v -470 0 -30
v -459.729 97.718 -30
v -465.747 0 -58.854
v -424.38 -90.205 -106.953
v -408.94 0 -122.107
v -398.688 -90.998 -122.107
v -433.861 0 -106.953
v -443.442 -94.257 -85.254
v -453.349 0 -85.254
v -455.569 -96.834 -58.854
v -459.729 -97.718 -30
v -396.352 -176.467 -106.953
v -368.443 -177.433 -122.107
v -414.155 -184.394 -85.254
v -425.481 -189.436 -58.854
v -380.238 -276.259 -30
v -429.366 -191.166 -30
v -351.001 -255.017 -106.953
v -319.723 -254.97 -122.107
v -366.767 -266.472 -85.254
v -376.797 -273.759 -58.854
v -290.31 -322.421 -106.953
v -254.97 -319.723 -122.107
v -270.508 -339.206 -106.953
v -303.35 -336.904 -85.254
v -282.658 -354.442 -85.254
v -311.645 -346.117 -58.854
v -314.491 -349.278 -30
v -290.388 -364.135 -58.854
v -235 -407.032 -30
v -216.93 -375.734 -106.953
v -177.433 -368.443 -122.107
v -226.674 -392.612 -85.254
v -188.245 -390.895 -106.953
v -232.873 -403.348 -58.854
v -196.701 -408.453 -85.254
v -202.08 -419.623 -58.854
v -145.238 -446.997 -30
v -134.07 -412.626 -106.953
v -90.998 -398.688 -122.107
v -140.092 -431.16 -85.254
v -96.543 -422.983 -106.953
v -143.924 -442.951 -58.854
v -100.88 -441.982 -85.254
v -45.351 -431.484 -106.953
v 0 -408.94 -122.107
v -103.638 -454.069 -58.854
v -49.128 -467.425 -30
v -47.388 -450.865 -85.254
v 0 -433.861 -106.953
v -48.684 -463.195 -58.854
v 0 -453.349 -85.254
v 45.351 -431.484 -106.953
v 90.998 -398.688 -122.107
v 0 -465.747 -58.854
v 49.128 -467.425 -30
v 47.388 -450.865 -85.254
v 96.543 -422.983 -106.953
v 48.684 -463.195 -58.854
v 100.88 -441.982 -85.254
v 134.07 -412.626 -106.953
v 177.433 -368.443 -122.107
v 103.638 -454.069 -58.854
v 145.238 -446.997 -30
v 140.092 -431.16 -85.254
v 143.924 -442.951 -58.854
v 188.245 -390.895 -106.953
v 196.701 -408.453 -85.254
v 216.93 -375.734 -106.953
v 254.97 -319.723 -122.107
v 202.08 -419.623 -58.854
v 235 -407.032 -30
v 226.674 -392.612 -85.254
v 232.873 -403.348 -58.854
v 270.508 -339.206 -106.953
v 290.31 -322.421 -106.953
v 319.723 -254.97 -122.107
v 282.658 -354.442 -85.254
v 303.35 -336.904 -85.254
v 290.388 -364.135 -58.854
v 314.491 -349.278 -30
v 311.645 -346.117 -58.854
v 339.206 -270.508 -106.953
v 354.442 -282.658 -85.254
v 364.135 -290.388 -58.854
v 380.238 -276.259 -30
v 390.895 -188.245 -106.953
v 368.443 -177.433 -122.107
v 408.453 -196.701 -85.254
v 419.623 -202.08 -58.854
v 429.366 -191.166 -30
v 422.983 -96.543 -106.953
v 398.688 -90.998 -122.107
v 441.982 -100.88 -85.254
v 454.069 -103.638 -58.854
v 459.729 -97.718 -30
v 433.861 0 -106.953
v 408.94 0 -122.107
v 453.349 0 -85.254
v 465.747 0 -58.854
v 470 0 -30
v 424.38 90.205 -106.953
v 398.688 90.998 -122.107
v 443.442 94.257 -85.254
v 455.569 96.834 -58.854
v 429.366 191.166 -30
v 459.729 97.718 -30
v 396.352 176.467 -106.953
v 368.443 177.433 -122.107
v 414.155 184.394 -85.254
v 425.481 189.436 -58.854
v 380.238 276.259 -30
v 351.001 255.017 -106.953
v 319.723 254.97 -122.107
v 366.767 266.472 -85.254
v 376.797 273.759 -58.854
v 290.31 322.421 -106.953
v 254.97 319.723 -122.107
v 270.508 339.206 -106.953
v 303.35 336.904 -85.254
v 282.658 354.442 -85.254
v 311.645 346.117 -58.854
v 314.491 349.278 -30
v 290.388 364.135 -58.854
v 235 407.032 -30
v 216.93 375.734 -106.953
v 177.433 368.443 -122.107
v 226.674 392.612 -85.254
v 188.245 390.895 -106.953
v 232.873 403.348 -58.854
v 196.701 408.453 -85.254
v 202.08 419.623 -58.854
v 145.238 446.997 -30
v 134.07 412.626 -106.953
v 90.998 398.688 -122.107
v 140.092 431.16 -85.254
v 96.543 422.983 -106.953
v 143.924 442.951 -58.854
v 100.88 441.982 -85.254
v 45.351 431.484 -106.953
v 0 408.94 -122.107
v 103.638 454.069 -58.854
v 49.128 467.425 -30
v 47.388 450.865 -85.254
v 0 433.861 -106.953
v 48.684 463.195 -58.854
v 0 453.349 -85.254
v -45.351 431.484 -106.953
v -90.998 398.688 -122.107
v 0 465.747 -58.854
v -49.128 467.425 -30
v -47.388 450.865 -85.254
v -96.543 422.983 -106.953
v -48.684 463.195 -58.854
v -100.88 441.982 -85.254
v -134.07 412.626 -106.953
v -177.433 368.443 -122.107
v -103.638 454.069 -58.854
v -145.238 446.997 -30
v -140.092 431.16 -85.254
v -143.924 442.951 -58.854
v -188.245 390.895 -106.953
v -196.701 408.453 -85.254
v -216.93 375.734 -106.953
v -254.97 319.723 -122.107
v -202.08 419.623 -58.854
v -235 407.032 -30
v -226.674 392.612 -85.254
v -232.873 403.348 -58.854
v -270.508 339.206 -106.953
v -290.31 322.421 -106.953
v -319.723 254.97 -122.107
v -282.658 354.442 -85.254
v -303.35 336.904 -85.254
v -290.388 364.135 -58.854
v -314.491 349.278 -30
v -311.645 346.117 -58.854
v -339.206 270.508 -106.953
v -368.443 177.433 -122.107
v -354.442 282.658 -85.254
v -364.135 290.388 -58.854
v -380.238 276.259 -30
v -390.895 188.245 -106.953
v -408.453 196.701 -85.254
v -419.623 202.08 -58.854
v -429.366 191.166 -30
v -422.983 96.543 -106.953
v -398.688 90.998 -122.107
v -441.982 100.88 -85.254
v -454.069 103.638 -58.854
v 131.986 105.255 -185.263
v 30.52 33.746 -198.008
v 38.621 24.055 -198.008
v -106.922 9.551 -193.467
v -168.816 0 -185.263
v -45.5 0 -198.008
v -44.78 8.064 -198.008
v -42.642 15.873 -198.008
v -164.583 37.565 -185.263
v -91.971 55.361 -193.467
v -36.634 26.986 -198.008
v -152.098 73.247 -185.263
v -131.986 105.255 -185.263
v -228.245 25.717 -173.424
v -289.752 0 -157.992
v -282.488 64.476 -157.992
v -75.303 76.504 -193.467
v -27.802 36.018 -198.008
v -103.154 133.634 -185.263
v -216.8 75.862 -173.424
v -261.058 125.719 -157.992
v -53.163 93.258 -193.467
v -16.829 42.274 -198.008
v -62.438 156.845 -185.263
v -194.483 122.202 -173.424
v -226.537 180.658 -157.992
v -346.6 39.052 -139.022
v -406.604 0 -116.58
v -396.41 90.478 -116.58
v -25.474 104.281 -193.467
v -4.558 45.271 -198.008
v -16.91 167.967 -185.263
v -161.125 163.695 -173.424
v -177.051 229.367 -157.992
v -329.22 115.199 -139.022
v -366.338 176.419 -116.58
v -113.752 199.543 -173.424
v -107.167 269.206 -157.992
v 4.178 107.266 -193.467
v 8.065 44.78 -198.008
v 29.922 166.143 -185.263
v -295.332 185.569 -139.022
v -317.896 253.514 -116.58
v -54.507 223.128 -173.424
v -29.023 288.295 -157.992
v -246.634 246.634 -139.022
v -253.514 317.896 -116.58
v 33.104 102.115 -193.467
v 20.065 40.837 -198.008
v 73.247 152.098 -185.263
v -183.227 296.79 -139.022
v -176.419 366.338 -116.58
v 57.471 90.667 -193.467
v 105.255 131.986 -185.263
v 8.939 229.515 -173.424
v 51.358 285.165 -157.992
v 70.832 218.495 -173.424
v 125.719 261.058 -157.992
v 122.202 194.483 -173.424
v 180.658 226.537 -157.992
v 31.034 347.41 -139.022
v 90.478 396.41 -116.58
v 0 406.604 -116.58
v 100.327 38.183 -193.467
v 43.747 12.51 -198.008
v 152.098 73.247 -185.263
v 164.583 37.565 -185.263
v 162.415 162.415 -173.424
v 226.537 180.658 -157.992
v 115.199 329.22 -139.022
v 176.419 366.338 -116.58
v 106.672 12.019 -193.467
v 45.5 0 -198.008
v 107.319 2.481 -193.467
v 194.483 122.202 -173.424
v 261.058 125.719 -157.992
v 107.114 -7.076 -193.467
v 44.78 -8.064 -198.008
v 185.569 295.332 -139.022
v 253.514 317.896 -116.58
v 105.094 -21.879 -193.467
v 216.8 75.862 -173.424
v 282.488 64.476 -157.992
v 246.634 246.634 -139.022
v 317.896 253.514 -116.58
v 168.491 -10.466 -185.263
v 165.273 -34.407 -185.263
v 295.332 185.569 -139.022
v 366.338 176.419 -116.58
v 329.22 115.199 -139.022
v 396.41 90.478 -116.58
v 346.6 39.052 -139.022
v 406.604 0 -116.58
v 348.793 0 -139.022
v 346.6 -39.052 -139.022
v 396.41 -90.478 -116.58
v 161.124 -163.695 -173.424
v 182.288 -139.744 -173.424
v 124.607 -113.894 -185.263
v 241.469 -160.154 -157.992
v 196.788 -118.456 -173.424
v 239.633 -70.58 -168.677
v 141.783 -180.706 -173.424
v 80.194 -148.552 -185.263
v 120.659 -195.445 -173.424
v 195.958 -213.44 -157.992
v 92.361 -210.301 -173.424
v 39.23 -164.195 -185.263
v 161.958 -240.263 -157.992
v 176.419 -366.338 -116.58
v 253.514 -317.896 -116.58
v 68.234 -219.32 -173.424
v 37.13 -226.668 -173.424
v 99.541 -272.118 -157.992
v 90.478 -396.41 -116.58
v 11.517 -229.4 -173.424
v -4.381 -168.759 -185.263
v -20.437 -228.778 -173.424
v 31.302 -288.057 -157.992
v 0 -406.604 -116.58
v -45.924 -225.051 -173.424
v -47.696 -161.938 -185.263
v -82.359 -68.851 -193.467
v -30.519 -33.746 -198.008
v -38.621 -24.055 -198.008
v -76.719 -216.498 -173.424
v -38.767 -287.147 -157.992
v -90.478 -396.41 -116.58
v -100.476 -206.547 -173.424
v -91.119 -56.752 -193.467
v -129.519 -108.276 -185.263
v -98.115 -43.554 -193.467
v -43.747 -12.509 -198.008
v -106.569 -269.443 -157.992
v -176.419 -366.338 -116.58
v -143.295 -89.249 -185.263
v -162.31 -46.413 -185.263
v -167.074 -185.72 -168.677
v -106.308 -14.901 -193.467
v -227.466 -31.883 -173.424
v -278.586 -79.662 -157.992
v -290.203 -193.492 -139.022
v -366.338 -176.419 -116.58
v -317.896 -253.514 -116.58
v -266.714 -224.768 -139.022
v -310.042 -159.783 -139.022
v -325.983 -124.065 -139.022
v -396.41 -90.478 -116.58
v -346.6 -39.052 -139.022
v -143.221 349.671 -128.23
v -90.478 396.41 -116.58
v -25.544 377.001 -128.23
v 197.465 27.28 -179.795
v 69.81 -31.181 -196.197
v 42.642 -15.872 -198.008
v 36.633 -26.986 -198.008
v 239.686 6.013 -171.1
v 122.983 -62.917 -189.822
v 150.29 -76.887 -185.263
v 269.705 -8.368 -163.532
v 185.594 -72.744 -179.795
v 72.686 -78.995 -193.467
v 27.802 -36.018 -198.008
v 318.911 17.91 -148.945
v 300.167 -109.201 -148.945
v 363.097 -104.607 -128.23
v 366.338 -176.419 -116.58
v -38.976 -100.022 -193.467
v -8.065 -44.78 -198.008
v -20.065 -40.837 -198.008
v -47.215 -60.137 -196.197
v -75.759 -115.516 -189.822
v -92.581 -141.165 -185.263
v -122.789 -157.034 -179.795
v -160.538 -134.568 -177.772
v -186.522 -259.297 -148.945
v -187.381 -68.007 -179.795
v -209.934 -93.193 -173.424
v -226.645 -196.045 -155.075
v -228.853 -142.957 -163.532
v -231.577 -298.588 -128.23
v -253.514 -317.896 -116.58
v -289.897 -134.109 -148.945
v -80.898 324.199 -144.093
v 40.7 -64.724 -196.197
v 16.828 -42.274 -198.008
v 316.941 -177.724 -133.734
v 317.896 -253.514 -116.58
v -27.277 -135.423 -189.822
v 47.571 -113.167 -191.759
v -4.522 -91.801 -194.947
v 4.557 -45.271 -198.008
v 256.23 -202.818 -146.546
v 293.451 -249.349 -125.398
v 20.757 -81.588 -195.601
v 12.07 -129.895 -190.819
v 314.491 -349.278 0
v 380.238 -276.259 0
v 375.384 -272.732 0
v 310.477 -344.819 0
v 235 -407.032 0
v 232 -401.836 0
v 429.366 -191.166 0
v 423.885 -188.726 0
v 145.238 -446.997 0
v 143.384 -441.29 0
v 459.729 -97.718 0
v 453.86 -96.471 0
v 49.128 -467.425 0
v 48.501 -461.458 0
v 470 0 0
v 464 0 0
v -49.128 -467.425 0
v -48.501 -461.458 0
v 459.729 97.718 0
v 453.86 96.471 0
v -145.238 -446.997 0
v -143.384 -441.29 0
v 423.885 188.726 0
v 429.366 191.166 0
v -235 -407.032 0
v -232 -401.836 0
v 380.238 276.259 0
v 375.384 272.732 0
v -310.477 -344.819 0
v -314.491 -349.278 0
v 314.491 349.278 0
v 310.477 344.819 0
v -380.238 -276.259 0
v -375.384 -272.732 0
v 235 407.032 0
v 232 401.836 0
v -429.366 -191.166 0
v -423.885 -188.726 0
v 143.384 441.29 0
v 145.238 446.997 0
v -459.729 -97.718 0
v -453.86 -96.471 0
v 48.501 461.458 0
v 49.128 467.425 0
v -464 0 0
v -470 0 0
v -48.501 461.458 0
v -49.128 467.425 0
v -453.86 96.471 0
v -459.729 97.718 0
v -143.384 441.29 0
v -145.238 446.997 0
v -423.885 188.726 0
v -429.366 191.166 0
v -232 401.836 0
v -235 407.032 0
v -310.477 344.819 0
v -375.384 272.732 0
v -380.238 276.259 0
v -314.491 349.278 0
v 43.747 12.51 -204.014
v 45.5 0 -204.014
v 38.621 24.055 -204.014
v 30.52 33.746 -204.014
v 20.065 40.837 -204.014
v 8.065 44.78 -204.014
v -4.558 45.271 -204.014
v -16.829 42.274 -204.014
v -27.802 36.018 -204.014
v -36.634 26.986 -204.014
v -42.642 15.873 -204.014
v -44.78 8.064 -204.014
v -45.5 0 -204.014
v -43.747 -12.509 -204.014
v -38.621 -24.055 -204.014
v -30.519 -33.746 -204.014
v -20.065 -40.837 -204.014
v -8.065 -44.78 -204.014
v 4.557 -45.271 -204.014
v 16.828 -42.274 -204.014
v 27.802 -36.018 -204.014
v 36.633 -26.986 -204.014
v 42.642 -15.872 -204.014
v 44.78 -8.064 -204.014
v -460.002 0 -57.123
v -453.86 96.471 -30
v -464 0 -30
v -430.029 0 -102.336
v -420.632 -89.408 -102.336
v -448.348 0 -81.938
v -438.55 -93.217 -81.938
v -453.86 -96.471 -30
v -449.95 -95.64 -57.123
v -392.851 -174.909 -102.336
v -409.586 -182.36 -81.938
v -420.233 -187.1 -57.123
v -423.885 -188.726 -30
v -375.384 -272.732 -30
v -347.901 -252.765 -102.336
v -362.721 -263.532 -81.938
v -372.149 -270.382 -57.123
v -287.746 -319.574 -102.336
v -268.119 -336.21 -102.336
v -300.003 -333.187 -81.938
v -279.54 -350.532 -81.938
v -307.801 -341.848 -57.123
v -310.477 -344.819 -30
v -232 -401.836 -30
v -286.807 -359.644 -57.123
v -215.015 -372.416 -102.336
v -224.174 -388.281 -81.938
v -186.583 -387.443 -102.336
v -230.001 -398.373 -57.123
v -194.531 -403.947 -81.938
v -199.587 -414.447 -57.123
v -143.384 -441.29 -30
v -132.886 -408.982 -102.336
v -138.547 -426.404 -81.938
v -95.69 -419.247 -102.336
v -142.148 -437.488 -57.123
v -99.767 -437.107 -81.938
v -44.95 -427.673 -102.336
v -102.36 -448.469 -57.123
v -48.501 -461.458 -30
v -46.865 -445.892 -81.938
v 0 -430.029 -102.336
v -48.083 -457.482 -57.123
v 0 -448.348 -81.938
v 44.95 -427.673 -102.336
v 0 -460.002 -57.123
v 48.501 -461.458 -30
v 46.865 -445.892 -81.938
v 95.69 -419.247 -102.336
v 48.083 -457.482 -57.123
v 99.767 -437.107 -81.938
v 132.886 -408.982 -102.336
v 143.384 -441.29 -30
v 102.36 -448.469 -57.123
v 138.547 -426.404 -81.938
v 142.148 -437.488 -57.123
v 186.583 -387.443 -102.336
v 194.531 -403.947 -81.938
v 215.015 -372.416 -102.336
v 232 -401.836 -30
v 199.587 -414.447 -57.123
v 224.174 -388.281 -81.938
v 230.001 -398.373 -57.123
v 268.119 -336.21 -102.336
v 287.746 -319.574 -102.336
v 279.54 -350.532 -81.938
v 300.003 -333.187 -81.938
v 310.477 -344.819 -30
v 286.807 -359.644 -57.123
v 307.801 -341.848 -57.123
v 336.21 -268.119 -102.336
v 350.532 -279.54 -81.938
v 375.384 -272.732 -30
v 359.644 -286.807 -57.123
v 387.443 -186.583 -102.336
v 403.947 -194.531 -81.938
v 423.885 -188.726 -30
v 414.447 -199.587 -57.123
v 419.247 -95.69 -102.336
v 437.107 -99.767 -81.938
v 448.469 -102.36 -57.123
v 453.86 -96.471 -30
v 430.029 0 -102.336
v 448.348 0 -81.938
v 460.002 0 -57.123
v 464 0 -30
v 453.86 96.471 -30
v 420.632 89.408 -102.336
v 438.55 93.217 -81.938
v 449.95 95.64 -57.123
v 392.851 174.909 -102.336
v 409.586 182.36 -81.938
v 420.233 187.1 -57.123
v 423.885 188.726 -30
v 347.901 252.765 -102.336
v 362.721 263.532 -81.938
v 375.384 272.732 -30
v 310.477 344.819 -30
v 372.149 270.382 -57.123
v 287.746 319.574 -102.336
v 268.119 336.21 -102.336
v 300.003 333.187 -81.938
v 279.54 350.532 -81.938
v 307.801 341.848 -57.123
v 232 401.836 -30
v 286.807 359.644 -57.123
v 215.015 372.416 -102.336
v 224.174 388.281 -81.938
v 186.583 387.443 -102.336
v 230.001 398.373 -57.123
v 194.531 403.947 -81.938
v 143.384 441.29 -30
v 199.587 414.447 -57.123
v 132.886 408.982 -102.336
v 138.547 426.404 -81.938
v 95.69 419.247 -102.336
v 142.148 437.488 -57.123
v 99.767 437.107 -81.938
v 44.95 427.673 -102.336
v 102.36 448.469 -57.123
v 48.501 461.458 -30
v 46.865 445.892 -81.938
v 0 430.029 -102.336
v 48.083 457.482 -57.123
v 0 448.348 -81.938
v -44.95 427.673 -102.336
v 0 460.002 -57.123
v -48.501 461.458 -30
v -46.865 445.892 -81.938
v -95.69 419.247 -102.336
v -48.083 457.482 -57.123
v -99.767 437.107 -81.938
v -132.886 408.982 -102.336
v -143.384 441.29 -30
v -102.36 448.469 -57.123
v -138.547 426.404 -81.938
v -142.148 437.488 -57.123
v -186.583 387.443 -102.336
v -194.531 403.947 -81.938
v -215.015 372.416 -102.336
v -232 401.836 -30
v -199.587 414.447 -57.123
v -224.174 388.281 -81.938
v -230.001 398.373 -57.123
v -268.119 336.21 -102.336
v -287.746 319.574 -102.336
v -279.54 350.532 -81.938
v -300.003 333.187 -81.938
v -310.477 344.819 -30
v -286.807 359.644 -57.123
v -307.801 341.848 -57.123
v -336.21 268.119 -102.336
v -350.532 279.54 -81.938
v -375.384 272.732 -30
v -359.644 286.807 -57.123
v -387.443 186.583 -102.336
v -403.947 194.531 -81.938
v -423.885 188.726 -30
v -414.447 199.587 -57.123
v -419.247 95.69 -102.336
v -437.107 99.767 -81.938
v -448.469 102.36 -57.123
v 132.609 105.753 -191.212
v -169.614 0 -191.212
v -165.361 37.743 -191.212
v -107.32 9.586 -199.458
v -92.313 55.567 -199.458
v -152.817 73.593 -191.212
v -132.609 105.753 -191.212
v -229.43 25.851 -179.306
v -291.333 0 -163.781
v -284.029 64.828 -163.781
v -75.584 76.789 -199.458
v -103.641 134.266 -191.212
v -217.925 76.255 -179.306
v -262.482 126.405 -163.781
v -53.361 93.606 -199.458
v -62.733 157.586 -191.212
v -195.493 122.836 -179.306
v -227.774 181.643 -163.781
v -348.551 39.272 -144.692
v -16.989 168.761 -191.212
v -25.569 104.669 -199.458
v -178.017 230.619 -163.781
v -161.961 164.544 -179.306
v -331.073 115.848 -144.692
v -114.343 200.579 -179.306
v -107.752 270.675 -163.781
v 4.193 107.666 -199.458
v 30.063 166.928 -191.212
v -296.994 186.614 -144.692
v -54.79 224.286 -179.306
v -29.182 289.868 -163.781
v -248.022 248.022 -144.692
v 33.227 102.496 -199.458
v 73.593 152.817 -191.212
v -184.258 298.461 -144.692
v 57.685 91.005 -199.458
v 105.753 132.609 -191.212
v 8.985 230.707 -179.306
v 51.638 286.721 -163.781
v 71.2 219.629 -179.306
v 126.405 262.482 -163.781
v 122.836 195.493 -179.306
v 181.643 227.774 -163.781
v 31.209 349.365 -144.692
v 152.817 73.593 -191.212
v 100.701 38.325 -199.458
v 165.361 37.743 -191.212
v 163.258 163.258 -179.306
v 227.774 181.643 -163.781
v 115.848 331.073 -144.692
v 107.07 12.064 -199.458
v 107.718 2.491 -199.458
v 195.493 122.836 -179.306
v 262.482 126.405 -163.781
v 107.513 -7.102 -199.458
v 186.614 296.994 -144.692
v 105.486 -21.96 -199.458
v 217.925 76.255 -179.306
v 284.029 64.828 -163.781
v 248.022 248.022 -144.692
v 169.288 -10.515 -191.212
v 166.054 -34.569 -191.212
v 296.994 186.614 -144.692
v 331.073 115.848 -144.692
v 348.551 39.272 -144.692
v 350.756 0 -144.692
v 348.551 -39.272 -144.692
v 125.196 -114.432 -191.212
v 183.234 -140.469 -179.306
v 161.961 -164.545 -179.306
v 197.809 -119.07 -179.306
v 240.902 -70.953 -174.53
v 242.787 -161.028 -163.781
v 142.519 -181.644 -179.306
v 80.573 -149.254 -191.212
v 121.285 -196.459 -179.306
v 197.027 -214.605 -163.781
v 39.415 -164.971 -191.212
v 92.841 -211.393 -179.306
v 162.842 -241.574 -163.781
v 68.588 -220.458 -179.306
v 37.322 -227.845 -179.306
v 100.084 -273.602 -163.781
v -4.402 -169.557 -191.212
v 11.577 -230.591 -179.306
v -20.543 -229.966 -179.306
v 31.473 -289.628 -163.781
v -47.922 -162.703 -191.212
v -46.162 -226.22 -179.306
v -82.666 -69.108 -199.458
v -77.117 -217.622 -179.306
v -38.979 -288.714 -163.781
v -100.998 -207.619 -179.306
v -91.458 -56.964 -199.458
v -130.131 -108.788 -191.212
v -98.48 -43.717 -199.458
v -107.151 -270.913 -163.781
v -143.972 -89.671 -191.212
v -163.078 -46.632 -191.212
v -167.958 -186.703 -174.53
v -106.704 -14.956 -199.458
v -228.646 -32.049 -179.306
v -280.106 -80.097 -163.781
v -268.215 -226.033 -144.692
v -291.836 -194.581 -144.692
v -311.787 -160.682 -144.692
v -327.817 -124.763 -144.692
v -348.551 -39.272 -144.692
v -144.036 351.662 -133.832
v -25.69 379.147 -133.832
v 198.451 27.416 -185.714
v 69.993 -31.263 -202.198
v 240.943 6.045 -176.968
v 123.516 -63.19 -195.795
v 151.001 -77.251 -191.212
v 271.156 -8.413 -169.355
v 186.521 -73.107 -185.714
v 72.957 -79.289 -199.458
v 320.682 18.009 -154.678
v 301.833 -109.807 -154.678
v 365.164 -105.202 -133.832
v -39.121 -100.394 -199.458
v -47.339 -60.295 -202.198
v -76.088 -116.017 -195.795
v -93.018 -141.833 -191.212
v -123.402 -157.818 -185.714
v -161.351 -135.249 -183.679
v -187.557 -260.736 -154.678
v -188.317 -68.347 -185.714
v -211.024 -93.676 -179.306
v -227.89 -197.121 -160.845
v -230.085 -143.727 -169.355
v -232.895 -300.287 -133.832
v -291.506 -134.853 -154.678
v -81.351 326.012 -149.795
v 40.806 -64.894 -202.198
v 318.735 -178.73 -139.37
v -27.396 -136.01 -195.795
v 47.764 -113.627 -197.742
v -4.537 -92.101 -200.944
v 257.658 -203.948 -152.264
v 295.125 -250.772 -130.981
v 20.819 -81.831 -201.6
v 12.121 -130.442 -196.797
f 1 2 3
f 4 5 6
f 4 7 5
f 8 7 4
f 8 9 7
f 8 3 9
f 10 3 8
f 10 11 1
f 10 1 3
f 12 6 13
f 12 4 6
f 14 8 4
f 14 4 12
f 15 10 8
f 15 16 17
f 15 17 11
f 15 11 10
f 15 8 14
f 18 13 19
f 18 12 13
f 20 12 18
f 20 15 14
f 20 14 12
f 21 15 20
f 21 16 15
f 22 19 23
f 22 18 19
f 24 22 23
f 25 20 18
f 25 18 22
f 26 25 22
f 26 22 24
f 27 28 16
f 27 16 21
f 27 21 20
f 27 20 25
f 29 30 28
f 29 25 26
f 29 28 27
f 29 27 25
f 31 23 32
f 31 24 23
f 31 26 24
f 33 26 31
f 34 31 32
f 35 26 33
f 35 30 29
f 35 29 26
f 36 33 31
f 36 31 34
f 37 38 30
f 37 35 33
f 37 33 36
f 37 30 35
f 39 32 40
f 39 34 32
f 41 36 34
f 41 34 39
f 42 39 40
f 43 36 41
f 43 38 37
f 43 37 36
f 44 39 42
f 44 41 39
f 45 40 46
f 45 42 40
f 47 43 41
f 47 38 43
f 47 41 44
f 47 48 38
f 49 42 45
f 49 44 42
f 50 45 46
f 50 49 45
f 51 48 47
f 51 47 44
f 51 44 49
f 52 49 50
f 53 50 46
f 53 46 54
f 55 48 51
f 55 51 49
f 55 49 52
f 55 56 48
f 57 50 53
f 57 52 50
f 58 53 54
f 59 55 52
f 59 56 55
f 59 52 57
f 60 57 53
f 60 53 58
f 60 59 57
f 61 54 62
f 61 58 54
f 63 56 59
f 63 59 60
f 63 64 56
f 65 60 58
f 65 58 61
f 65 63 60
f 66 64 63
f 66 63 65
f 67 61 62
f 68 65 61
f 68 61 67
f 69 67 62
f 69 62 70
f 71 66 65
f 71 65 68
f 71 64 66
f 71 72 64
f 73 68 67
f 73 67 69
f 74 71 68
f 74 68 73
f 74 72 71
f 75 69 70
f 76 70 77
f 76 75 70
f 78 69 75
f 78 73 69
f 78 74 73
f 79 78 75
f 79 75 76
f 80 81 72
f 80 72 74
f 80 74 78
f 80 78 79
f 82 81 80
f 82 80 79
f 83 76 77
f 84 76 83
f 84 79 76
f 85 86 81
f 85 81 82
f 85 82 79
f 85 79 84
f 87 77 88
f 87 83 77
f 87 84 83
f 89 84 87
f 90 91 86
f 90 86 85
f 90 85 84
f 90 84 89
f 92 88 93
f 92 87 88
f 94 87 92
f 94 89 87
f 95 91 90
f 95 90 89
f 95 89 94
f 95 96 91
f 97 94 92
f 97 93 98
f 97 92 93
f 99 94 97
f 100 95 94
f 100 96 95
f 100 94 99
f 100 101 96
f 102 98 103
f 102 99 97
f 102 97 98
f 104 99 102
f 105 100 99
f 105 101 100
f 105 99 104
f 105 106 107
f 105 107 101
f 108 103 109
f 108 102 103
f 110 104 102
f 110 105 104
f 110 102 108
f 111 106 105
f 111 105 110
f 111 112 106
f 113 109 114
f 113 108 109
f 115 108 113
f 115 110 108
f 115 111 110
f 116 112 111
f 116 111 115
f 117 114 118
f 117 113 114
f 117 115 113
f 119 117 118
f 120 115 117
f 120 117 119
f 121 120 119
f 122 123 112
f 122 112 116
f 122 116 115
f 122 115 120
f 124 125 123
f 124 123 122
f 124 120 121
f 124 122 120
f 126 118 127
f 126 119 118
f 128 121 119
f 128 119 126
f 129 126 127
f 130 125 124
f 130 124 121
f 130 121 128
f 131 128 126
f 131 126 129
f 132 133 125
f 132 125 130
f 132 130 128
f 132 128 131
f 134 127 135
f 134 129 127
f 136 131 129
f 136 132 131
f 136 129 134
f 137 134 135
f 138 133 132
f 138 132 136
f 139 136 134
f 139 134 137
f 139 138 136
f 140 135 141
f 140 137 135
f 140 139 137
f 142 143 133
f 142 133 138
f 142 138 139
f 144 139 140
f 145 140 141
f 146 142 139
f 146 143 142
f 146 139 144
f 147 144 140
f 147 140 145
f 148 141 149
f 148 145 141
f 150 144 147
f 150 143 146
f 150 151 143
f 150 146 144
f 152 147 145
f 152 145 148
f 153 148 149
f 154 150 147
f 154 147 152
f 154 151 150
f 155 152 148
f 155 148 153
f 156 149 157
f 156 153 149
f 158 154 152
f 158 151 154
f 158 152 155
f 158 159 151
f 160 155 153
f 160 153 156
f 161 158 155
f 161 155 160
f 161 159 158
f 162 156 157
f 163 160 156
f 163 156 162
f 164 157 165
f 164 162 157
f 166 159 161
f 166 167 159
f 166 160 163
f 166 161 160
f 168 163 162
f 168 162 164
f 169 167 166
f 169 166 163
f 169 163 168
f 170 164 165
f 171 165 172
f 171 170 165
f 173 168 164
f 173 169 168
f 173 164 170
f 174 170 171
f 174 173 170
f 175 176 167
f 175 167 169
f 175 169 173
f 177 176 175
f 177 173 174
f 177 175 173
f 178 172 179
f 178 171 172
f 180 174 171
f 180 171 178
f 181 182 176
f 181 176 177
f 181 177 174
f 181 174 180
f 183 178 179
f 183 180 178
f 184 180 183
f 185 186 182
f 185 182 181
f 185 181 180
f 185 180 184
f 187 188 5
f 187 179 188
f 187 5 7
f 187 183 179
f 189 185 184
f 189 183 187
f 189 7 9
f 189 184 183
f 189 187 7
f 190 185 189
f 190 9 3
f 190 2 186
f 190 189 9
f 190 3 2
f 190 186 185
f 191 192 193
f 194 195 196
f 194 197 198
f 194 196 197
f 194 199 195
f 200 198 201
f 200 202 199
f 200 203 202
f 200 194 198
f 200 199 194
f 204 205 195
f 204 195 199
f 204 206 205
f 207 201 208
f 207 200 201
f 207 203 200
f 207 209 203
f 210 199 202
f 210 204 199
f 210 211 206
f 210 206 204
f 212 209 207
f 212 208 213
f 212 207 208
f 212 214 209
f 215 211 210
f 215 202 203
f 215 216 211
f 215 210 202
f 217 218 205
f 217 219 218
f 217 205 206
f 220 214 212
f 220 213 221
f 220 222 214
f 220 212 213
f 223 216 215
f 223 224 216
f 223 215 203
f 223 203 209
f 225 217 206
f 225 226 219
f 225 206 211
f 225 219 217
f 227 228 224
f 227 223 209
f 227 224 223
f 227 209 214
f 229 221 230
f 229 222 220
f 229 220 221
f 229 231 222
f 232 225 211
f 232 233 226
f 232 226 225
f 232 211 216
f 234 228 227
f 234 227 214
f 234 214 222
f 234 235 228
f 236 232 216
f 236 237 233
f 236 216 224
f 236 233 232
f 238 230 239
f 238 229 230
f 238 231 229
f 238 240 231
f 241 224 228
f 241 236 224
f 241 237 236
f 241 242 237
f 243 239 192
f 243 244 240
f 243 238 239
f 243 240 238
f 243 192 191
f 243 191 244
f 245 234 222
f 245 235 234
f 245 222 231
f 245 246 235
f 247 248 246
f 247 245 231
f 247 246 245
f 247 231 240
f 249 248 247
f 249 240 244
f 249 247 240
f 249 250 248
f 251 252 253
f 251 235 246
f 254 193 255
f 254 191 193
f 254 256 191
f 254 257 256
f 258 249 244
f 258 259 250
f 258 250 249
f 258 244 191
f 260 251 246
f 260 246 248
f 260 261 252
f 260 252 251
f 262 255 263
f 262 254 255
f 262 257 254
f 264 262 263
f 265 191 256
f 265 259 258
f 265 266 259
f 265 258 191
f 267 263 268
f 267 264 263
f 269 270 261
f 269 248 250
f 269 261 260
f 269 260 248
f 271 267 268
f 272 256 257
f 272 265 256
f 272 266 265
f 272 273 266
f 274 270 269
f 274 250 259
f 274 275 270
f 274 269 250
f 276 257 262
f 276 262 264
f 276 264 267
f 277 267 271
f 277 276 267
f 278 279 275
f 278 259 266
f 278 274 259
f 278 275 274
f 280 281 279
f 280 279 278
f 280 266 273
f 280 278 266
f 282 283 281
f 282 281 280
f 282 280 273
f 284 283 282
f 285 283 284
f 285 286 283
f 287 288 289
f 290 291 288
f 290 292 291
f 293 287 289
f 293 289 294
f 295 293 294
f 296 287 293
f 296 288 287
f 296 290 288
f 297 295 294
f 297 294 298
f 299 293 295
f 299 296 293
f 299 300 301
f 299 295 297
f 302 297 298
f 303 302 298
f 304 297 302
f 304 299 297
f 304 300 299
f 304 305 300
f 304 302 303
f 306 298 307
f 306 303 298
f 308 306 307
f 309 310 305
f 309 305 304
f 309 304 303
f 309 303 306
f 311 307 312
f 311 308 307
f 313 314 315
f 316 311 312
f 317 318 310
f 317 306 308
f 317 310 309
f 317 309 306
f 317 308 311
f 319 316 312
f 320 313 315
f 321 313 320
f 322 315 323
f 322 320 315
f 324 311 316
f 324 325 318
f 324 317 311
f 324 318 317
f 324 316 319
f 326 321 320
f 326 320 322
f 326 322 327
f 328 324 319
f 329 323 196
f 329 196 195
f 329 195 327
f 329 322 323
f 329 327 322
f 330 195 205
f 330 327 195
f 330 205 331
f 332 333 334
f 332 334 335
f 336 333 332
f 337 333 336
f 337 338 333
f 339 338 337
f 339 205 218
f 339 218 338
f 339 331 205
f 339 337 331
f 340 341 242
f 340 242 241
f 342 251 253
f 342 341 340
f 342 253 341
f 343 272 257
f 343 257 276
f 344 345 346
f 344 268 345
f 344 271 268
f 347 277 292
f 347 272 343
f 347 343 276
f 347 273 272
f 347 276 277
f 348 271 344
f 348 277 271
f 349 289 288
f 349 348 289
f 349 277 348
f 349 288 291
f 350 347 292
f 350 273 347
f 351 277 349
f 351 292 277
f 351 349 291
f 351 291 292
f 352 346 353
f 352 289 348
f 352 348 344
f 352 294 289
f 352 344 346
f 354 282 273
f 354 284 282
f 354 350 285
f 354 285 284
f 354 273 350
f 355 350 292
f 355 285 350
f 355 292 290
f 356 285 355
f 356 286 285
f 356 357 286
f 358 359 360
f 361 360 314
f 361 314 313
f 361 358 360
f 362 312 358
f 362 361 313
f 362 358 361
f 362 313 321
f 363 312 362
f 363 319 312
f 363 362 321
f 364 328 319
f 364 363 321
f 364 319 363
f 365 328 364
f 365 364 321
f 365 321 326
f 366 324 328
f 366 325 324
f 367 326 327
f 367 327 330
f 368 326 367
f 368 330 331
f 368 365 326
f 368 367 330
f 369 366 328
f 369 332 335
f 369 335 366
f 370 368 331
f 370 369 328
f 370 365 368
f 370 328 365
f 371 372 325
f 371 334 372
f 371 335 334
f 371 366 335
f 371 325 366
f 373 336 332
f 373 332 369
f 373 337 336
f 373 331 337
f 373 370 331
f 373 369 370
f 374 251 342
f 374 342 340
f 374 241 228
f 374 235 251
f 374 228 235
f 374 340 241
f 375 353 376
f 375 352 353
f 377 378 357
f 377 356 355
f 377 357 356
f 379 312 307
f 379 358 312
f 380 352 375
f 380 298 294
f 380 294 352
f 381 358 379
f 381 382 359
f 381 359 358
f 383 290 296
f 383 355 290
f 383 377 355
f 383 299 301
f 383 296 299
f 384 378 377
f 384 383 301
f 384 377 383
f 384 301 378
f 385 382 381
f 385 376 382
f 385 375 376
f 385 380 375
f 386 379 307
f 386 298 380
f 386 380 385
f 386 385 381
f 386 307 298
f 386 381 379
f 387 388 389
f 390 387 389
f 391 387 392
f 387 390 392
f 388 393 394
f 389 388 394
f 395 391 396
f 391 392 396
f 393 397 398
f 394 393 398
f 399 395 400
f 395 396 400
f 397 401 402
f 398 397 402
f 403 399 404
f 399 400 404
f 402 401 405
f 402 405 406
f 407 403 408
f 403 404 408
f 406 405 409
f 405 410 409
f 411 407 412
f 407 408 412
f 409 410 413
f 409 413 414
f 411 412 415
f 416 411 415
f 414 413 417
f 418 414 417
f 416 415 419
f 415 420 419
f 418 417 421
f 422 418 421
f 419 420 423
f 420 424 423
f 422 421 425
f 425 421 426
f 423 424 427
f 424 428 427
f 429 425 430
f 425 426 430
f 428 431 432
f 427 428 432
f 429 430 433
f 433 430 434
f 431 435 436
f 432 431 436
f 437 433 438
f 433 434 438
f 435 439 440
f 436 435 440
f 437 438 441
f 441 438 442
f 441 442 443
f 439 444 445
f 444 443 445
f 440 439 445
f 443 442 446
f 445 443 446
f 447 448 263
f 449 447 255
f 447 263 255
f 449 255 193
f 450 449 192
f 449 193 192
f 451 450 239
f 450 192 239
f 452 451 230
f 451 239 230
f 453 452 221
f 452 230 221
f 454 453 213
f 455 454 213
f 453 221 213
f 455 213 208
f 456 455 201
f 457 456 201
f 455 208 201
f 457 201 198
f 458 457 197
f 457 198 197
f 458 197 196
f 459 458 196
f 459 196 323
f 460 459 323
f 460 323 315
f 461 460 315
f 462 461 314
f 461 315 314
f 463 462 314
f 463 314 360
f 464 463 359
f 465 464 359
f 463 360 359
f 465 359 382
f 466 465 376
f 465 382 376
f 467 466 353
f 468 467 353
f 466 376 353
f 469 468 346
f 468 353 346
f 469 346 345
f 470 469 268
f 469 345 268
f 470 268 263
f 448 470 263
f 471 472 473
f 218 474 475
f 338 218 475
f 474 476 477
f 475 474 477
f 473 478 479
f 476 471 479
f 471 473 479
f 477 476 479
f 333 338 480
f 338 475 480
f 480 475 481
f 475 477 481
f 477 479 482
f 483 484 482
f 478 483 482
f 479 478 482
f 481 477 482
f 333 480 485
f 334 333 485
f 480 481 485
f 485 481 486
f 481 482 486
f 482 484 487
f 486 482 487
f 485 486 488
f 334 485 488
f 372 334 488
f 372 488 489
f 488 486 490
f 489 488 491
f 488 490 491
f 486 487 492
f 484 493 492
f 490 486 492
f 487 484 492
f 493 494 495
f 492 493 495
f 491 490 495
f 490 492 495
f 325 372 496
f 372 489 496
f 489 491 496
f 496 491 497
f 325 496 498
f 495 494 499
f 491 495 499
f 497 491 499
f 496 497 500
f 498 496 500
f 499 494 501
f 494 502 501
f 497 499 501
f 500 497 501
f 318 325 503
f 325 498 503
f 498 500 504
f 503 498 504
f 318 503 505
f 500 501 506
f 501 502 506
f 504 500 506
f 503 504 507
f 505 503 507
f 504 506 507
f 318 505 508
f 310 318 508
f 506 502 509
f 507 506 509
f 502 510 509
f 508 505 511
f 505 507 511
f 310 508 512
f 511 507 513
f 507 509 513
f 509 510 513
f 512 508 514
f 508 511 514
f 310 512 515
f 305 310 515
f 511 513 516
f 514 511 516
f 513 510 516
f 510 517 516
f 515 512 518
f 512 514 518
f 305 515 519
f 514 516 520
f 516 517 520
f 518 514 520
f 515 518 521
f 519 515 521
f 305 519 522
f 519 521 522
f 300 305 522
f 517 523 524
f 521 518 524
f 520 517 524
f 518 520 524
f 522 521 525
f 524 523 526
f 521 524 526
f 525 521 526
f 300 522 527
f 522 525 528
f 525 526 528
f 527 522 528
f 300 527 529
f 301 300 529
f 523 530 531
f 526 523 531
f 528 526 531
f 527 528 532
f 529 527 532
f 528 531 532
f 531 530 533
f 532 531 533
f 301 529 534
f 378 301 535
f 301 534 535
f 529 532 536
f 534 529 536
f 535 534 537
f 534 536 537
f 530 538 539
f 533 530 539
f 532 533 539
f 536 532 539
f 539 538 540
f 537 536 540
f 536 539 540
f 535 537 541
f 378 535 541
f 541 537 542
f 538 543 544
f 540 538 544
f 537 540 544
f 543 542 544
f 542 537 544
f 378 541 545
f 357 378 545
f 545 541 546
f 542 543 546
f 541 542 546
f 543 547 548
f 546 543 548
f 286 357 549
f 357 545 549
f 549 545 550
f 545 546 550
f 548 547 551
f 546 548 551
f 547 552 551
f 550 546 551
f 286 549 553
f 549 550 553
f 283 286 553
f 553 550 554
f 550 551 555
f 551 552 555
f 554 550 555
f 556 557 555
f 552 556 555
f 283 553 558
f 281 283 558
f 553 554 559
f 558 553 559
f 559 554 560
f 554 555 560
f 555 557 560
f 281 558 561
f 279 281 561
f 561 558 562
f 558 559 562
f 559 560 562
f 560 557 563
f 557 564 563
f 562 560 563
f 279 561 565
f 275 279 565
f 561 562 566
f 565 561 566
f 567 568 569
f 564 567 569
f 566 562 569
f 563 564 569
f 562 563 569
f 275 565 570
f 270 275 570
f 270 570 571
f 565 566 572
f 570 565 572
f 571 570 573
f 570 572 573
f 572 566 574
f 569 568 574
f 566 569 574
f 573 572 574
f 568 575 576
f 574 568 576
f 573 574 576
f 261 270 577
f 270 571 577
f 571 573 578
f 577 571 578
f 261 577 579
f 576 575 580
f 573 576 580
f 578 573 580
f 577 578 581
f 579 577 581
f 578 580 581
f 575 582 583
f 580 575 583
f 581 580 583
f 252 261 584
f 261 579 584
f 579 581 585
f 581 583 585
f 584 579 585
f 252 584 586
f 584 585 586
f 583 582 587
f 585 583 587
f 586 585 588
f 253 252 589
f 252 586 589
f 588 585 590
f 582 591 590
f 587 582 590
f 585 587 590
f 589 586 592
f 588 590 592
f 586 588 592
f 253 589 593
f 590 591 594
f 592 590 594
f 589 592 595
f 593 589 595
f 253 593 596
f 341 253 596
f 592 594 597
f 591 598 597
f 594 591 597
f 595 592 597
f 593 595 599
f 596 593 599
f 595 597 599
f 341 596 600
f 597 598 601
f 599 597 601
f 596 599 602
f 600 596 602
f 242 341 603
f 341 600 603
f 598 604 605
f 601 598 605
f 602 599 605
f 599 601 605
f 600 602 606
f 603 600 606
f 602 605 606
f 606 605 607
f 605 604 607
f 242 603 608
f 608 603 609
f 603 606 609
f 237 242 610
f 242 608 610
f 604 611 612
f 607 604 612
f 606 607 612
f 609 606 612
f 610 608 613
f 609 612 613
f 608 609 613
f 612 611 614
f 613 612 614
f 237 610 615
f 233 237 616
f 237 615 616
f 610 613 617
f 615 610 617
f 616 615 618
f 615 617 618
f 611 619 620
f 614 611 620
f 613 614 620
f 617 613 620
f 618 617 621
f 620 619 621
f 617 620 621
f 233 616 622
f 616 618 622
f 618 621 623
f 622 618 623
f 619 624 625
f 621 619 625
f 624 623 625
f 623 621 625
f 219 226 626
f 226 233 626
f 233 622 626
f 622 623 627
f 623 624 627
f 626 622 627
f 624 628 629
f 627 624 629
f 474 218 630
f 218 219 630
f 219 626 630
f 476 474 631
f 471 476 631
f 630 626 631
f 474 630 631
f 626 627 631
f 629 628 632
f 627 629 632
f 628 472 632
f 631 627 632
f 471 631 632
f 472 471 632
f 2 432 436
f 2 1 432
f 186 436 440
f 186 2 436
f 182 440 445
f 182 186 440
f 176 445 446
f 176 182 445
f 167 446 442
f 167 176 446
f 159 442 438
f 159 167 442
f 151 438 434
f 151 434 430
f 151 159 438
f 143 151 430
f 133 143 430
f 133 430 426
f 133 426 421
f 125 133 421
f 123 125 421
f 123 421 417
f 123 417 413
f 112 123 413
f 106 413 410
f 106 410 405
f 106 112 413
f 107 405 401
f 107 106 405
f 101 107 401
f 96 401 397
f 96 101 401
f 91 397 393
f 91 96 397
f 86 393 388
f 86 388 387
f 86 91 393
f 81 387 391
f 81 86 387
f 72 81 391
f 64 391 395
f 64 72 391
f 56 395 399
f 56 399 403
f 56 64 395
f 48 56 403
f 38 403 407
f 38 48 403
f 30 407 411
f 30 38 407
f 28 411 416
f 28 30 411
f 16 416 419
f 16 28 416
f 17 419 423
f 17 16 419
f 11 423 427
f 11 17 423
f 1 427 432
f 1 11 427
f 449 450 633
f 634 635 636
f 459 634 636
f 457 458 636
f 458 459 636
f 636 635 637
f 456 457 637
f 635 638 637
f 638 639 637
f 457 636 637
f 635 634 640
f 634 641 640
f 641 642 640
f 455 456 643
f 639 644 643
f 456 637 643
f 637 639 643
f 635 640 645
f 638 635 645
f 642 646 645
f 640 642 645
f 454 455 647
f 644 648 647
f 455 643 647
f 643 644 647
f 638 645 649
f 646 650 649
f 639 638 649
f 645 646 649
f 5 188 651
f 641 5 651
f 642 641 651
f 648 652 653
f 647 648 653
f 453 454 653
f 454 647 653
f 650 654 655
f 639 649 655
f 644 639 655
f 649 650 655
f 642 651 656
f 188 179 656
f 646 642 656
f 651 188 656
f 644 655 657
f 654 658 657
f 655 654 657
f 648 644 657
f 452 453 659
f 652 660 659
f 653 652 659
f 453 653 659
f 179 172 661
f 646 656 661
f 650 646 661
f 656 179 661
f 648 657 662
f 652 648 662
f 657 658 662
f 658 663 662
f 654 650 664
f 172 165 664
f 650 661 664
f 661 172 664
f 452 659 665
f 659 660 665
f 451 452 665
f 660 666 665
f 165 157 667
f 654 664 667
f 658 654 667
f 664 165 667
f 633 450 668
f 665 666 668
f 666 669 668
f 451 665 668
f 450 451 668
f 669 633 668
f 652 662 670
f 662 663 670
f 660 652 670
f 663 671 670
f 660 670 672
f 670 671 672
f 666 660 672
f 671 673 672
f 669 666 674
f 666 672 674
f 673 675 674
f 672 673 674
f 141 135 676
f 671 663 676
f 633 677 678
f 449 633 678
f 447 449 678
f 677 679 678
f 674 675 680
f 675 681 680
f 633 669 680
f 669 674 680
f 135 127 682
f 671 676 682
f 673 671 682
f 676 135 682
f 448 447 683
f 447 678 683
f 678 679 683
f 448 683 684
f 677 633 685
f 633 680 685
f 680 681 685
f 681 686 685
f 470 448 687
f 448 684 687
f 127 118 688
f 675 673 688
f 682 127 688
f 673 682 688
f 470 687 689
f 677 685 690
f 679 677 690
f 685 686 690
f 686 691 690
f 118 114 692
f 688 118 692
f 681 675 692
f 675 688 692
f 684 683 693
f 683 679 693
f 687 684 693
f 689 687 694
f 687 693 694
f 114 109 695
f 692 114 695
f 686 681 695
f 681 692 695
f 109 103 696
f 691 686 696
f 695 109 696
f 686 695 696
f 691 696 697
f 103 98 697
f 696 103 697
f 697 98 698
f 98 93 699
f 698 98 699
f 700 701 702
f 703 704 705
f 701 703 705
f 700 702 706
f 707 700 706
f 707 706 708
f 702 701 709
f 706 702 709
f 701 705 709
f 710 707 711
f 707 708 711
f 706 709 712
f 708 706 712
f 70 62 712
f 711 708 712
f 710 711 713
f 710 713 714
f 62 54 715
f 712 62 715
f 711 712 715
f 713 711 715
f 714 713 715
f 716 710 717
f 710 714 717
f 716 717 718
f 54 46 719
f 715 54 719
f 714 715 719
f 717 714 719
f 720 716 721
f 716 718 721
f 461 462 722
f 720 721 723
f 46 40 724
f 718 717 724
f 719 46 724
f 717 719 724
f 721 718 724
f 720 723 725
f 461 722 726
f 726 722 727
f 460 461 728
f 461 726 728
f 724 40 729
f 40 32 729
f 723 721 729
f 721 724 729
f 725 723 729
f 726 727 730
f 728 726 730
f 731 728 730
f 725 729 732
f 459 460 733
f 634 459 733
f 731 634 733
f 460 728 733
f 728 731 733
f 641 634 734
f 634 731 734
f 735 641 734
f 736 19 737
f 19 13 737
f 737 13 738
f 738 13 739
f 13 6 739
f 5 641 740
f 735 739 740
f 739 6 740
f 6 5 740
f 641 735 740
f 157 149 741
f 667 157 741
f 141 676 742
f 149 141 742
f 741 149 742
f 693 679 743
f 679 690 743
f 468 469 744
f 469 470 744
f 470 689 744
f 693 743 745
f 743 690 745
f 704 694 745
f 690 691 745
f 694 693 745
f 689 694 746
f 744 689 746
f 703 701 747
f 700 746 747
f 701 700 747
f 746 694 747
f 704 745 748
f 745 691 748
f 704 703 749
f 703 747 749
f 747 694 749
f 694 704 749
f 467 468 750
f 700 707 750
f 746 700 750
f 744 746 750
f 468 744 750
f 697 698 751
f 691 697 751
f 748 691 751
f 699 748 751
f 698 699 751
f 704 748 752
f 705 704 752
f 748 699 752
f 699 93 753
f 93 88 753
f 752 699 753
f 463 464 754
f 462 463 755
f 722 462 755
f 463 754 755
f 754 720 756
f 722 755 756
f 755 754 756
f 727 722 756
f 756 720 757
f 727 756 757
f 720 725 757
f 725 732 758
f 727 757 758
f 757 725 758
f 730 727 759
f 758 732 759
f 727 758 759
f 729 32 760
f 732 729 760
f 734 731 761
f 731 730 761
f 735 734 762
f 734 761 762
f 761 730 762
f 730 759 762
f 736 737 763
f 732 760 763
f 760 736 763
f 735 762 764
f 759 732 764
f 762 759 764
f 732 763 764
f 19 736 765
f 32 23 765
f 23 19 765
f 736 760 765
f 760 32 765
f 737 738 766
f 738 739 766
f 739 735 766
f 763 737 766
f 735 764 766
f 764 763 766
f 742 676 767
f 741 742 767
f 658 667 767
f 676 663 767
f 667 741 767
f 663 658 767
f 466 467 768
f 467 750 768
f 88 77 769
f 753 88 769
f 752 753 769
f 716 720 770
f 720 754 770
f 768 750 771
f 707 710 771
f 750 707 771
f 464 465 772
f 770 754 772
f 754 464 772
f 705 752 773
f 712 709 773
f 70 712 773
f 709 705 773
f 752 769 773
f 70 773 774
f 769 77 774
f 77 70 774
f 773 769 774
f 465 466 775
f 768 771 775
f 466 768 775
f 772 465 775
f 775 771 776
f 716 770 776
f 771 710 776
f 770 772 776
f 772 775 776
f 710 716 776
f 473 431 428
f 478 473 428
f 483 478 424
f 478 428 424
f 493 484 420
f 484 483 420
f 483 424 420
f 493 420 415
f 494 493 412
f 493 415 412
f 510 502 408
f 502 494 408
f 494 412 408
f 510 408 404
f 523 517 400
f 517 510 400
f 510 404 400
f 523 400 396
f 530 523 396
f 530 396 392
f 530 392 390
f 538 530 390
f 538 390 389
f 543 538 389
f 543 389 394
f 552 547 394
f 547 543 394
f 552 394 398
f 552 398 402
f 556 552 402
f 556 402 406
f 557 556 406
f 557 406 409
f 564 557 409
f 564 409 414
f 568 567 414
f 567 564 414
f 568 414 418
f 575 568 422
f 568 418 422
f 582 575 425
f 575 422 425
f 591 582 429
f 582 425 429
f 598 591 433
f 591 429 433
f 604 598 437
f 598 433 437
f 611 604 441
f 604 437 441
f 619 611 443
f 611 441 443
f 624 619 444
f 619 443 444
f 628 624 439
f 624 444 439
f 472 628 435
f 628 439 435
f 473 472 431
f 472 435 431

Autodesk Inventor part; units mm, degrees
ref_plane "YZ Plane" through (0, 0, 0) normal (1, 0, 0) x (0, 1, 0)
ref_plane "XZ Plane" through (0, 0, 0) normal (0, 1, 0) x (-1, 0, 0)
ref_plane "XY Plane" through (0, 0, 0) normal (0, 0, 1) x (1, 0, 0)
sketch "Sketch1" plane through (0, 0, 0) normal (0, 1, 0) x (-1, 0, 0)
  line L0 (470, 0) -> (470, -30)
  arc A0 (408.9405, -122.1066) -> (470, -30) centre (370, -30) ccw
  arc A1 (0, -205) -> (408.9405, -122.1066) centre (0, 845.1667) ccw
  line L1 (0, 191.6842) -> (0, -191.6842)
  arc A2 (0, -199) -> (406.6041, -116.5802) centre (0, 845.1667) ccw
  arc A3 (406.6041, -116.5802) -> (464, -30) centre (370, -30) ccw
  line L2 (464, -30) -> (464, 0)
  line L3 (464, 0) -> (470, 0)
  line L4 (0, -199) -> (0, -205)
  point P0 (0, 0)
  point P1 (0, 0)
  point P2 (0, -202)
  point P3 (0, -163.7009)
  point P4 (0, -169.7009)
  dimension "d0" = 100
  dimension "d1" = 30
  dimension "d3" = 1050.1667
  dimension "d6" = 6
  dimension "d11" = 928
  dimension "d12" = 205
revolve "Revolution1" add sketch "Sketch1" angle 360 about axis through (0, 0, 191.6842) along (0, 0, -1)
sketch "Sketch2" plane through (0, 0, 0) normal (0, 0, 1) x (1, 0, 0)
  circle A0 centre (0, 0) radius 45.5
  dimension "d8" = 91
extrude "Extrusion1" cut sketch "Sketch2" against normal through all
equation "\"d11\" = MAIN_filter_diam"
equation "\"MAIN_filter_diam\" = 928"
equation "\"Disherd_head_hight\" = d12"
properties part number "PRS 940-02 dished head" material "Steel"
